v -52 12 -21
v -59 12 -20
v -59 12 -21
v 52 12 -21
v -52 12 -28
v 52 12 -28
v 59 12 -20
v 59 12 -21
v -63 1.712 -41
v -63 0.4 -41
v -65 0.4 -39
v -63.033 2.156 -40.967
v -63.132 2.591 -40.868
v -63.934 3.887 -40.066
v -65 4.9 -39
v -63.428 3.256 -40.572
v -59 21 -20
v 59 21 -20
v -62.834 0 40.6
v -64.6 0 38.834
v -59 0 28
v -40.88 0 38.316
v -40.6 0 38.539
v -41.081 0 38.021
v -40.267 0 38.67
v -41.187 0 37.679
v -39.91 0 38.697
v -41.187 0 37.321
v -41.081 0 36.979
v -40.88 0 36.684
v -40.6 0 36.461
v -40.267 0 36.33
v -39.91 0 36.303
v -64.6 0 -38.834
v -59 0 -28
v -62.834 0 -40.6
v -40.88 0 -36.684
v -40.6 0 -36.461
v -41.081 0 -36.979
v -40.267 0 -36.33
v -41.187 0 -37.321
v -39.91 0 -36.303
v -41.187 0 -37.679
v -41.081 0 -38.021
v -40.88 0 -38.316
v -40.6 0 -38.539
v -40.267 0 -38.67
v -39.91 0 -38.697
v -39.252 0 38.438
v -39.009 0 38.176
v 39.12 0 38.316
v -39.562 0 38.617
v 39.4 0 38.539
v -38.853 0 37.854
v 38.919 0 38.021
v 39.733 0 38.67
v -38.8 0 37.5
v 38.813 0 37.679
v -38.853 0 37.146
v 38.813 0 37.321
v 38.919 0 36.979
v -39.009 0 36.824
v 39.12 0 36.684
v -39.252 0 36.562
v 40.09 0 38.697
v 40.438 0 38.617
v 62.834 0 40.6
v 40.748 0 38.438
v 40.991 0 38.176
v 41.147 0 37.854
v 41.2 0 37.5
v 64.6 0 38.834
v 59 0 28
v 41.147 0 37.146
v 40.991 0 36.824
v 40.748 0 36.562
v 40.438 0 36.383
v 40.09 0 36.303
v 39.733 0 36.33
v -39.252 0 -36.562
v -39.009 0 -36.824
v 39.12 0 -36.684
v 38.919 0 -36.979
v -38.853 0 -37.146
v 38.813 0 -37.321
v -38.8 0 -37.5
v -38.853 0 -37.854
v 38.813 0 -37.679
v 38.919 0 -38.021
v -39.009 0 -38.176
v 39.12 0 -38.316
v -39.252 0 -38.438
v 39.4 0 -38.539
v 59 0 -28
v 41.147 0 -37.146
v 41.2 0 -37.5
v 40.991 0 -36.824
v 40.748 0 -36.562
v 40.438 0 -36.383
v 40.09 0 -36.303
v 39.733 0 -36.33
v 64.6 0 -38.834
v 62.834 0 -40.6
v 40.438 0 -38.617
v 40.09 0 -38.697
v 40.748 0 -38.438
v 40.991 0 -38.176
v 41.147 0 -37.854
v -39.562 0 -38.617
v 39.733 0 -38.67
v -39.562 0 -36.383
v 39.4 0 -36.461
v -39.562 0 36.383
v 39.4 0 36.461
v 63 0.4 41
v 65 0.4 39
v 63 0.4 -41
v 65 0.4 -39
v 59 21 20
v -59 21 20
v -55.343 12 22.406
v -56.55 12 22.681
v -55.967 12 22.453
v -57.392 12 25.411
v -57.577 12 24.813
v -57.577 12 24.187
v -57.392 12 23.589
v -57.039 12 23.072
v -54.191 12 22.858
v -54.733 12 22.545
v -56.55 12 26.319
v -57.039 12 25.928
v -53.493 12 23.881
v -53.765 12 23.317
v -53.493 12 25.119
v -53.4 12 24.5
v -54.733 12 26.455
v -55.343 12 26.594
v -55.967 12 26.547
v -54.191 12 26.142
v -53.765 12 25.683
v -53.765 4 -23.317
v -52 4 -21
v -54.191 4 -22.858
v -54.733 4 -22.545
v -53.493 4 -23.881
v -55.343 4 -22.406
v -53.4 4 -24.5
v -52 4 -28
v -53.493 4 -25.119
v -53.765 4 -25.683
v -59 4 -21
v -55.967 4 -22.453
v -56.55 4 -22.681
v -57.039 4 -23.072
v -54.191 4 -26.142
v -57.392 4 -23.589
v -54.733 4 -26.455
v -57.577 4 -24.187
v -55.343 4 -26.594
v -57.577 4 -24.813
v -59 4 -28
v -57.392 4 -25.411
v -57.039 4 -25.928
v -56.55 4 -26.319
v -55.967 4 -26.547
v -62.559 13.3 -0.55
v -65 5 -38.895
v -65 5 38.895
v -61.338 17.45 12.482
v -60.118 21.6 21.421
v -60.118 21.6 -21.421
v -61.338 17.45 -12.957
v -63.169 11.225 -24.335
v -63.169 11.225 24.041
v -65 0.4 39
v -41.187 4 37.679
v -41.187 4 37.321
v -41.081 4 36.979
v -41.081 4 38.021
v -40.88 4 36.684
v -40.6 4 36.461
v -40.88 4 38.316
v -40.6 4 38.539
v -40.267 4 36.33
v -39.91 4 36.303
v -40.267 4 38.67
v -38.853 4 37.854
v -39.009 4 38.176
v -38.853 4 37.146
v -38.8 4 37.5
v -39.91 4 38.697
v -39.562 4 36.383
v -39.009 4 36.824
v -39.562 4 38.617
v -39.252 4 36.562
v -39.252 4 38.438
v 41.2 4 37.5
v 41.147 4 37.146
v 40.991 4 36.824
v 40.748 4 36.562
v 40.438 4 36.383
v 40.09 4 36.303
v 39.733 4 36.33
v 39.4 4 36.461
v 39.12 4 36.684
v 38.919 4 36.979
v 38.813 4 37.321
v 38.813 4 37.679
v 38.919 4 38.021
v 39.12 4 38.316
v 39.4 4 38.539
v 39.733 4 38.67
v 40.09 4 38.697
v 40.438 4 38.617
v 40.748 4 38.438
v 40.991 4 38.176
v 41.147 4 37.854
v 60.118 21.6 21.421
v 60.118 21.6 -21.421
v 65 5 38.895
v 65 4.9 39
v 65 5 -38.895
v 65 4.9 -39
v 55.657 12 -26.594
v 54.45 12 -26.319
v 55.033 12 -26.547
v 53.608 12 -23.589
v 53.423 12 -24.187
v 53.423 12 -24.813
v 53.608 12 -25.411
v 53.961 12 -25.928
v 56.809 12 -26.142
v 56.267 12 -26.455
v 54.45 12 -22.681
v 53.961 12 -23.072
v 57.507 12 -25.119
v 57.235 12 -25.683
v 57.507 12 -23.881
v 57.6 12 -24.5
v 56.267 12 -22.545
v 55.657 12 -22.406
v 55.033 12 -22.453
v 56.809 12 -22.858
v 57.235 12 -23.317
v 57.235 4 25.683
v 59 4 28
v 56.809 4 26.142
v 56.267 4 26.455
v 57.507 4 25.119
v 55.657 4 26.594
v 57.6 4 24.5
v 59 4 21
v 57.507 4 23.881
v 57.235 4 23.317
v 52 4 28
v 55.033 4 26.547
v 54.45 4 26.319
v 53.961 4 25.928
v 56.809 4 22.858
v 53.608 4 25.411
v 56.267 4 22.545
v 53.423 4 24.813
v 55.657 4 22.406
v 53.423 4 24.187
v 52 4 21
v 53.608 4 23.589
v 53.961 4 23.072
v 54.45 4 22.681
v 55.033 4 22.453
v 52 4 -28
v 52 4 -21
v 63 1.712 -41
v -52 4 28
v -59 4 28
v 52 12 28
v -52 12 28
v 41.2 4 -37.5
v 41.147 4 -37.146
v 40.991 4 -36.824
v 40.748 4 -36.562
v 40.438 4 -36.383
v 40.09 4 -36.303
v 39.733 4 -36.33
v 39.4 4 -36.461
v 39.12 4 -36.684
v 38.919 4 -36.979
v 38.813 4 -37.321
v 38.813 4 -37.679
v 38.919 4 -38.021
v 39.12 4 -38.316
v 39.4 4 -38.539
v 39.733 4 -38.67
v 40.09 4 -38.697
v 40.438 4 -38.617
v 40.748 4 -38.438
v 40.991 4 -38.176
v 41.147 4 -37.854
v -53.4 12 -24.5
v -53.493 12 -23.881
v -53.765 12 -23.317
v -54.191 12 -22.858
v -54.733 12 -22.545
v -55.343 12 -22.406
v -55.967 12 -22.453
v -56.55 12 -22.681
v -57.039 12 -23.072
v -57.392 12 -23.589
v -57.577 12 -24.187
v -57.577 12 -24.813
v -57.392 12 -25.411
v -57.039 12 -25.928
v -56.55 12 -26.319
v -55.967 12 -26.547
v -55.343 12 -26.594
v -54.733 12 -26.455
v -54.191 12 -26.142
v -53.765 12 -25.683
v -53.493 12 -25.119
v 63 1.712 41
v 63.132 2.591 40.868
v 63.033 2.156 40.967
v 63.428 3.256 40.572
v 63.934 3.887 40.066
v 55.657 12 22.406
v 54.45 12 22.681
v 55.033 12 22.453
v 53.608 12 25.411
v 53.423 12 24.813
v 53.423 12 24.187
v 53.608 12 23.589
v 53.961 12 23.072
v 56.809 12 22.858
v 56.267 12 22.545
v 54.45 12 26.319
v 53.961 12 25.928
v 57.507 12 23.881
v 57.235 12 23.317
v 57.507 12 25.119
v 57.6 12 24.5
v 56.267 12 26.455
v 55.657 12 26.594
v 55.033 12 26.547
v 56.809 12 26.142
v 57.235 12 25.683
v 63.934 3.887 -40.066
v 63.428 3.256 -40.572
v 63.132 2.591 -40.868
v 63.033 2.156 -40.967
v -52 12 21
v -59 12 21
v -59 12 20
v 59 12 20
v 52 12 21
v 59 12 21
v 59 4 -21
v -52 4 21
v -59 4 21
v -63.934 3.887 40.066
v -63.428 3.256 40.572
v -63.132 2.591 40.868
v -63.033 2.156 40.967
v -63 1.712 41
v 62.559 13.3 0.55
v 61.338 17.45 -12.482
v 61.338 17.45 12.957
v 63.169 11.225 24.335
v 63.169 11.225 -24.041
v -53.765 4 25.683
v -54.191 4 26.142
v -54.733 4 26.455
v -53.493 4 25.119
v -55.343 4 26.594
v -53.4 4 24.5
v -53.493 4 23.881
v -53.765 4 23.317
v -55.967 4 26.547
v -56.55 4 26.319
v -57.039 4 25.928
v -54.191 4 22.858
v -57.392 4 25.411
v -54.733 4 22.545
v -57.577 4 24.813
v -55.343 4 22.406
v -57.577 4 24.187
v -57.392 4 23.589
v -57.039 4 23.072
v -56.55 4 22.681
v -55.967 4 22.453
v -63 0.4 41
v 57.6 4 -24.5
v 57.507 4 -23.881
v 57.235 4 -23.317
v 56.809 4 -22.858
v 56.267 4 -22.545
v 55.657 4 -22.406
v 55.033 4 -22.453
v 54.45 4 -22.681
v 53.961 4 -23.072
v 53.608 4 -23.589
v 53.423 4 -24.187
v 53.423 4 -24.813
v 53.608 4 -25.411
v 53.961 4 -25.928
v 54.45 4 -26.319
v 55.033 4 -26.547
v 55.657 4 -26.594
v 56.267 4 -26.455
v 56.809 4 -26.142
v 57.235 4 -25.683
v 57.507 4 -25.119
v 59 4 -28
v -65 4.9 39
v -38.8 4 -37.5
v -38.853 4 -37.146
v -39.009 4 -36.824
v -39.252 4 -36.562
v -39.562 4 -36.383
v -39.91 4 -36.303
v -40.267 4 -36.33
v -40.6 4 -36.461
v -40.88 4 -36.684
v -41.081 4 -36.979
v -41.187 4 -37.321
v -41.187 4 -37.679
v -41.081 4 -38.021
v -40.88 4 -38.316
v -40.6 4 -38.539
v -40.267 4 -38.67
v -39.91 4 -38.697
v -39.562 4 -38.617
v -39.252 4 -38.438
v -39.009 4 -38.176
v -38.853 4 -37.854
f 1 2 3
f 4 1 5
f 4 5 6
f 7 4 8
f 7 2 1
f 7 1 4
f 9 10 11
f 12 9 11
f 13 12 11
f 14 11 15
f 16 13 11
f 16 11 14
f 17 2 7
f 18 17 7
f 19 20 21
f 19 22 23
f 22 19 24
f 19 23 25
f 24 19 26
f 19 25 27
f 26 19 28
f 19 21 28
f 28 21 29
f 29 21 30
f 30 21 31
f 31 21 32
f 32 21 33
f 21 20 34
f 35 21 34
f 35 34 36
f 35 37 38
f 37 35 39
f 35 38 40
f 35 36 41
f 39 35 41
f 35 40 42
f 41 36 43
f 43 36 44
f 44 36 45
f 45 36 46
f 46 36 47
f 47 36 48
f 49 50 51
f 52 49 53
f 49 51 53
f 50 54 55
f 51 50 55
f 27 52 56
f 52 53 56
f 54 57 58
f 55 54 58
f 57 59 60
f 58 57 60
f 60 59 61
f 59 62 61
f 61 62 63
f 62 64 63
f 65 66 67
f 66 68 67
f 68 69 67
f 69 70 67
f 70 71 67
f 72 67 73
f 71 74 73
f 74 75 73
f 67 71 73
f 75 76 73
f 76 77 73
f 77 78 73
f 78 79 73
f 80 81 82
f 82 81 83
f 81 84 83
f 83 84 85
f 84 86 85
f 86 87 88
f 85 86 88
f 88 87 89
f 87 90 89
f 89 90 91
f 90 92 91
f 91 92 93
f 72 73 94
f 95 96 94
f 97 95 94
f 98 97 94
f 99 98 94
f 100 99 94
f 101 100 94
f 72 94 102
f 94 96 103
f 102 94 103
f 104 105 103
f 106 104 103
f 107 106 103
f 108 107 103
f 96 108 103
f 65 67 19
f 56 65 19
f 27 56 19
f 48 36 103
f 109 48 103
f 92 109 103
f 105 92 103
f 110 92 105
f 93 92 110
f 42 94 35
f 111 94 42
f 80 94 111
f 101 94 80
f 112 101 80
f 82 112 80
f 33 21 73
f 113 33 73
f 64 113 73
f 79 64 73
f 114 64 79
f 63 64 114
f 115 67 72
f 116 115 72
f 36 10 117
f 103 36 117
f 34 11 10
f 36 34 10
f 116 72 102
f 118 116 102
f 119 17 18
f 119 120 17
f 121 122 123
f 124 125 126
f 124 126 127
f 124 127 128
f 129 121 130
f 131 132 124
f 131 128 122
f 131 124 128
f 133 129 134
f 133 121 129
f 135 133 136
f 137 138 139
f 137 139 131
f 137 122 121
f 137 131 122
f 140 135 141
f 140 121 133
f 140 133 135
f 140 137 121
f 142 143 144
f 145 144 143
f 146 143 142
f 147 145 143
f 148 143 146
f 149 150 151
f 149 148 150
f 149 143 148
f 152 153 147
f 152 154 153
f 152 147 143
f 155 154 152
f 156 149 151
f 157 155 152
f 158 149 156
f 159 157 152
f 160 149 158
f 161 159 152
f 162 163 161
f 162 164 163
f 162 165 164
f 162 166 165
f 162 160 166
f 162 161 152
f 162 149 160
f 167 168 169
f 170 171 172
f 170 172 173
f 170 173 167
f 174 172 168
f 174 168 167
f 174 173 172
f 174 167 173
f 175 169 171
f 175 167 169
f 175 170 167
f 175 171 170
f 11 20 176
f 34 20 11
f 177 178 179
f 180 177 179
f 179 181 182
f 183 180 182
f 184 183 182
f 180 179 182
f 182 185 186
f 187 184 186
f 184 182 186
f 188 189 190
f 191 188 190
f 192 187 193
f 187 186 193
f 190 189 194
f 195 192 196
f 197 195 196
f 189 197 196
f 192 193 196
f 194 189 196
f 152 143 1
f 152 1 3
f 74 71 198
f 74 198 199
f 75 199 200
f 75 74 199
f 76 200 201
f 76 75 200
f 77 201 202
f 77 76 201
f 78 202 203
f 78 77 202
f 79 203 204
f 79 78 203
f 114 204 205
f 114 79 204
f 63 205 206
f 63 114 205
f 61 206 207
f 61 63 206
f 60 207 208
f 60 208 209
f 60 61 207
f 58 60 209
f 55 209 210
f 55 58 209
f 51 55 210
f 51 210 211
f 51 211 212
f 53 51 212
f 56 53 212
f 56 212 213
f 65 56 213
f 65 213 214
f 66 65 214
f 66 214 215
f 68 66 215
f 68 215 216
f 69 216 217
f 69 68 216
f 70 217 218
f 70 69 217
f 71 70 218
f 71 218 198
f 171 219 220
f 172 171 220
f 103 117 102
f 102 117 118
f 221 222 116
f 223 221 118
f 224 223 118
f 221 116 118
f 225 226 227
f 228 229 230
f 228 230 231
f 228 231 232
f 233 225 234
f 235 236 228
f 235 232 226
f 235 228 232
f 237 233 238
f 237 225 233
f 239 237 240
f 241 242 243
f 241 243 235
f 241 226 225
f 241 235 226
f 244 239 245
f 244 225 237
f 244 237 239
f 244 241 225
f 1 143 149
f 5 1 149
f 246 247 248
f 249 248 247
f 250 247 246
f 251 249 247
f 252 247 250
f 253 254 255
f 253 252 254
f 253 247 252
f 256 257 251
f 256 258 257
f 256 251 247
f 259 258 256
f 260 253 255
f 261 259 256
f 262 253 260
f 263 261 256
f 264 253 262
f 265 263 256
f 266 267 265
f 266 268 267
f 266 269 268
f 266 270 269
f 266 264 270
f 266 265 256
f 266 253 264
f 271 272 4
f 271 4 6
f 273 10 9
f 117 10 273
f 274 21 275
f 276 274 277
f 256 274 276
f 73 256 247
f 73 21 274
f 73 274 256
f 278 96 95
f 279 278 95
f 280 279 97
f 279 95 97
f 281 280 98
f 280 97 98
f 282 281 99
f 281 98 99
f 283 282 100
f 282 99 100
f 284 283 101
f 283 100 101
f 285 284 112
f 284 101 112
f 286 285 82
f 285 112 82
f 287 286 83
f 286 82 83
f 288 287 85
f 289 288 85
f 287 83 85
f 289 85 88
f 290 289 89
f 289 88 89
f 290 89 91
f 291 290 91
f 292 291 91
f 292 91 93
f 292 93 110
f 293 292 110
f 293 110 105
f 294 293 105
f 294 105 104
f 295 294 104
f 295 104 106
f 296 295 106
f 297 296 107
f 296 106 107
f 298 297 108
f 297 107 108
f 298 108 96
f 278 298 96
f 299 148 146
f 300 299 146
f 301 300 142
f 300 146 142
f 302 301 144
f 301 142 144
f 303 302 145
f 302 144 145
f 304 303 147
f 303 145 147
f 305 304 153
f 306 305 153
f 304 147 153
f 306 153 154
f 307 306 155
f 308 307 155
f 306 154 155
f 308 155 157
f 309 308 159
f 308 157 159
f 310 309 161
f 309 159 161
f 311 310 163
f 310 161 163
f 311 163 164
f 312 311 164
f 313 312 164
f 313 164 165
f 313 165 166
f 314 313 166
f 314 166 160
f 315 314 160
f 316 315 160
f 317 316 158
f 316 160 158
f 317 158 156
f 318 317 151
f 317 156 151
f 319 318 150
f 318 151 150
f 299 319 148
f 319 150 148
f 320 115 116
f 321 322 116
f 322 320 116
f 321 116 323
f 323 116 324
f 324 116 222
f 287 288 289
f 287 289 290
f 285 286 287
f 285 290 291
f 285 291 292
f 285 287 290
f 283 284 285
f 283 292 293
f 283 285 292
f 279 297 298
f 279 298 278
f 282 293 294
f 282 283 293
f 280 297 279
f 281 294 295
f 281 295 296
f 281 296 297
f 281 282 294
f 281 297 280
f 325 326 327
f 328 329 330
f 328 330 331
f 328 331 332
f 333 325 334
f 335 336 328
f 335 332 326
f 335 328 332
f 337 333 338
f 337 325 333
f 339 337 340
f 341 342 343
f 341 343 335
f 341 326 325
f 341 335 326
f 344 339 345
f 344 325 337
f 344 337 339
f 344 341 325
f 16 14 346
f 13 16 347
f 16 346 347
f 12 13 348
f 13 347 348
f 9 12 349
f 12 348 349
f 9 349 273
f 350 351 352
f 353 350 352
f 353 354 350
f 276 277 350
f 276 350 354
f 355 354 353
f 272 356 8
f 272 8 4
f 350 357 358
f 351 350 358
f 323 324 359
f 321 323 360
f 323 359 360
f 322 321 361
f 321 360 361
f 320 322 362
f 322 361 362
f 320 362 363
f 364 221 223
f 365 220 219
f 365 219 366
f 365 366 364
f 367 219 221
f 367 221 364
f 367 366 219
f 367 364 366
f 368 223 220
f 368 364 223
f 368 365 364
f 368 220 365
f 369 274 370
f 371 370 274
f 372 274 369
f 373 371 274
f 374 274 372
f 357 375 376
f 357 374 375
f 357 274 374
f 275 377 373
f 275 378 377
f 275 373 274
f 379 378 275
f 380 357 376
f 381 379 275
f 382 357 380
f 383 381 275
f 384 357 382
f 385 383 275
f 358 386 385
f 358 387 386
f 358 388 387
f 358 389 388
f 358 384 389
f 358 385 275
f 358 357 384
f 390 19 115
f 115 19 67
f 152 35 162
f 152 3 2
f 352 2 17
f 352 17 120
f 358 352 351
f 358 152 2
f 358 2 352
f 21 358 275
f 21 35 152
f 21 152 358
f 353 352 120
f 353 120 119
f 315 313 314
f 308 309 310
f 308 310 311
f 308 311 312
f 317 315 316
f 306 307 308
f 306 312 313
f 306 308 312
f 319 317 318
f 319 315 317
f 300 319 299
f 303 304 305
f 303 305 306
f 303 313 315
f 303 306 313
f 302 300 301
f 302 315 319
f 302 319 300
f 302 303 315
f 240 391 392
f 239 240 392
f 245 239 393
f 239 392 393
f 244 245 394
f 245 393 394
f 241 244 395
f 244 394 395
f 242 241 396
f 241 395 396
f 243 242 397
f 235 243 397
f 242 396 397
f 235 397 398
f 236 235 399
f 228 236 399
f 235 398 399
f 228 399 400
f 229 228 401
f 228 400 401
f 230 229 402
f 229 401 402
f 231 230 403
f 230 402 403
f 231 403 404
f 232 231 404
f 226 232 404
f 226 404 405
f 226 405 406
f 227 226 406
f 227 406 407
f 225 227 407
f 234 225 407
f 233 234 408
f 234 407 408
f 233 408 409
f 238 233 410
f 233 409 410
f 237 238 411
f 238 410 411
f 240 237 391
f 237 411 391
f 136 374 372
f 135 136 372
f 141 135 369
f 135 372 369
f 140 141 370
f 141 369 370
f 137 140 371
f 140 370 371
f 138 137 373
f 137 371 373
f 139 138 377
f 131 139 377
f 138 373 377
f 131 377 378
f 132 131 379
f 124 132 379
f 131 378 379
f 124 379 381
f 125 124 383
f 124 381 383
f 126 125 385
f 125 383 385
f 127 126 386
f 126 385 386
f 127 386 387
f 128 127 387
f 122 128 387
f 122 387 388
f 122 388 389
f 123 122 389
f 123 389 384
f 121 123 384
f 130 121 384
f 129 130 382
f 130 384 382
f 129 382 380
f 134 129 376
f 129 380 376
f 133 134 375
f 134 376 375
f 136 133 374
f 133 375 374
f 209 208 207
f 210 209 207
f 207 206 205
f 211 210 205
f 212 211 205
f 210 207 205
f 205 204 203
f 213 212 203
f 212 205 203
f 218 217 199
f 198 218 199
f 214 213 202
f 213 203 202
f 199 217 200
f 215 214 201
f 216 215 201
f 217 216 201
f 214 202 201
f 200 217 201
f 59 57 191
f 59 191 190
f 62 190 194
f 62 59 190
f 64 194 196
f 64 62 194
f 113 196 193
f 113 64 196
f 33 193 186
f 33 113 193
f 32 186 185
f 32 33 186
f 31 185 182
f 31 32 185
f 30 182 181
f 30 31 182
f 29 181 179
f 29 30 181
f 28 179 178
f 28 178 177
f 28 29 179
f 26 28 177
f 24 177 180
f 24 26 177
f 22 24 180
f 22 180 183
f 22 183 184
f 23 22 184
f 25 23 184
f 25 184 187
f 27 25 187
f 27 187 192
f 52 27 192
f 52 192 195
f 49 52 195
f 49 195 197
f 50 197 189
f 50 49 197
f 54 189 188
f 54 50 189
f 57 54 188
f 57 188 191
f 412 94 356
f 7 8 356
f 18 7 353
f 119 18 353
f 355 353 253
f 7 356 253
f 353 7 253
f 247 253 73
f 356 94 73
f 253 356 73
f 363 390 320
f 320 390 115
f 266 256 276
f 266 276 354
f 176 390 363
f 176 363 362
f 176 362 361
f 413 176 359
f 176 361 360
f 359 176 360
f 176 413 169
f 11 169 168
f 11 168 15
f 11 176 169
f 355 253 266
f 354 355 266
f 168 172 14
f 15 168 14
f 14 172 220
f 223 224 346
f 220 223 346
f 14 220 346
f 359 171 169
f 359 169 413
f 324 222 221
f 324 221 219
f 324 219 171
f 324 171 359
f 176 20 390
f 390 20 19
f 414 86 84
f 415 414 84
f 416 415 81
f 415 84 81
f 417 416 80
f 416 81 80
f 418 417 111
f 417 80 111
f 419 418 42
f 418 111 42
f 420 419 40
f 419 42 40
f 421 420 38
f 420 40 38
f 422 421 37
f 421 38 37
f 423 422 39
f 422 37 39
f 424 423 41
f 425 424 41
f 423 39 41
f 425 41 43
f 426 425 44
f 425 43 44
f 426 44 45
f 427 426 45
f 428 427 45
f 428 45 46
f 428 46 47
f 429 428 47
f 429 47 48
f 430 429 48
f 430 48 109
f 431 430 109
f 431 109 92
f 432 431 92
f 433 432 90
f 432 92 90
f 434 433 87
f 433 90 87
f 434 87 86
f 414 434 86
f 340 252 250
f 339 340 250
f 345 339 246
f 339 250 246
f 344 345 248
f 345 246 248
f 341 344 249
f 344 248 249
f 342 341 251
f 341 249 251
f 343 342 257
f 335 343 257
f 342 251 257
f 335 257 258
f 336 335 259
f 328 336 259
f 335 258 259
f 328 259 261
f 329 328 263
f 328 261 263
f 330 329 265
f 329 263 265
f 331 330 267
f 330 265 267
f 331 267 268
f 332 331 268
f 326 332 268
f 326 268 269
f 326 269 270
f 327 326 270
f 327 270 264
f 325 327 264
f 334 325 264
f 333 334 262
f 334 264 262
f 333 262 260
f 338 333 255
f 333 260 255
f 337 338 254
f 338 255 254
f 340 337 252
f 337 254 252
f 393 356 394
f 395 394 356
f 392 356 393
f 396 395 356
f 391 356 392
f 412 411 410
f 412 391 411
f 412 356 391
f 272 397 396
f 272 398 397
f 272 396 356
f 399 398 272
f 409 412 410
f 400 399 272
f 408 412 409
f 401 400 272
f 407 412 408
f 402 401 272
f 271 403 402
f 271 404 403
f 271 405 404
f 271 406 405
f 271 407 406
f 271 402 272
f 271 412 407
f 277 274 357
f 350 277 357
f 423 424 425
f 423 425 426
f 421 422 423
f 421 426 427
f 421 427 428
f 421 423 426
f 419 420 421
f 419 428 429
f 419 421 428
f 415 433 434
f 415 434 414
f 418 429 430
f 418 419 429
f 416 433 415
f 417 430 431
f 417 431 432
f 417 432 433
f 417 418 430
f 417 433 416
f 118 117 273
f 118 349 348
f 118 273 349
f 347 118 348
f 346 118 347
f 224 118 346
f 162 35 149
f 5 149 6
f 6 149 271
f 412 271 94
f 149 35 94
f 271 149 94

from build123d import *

# Parameters (mm, degrees)
SKETCH1_W               = 130
SKETCH1_H               = 82
BOSS_EXTRUDE1_DEPTH     = 5
SKETCH3_W               = 130
SKETCH3_H               = 82
SKETCH2_W               = 120
SKETCH2_H               = 46
CHAMFER1_SIZE           = 2
SKETCH4_R               = 1.2
CUT_EXTRUDE1_DEPTH      = 4
SKETCH5_W               = 114
SKETCH5_H               = 40
CUT_EXTRUDE2_DEPTH      = 21
SKETCH6_W               = 118
SKETCH6_H               = 56
CUT_EXTRUDE3_DEPTH      = 12
SKETCH8_W               = 7
SKETCH8_H               = 7
BOSS_EXTRUDE2_DEPTH     = 8
SKETCH9_R               = 2.1
CUT_EXTRUDE4_DEPTH      = 8
SKETCH10_W              = 2
SKETCH10_H              = 40
CUT_EXTRUDE5_DEPTH      = 9
CUT_EXTRUDE6_DEPTH      = 66.0000001
CUT_EXTRUDE6_DEPTH_BACK = 66.0000001
SKETCH12_W              = 82
SKETCH12_H              = 2
CUT_EXTRUDE7_DEPTH      = 66.0000001
CUT_EXTRUDE7_DEPTH_BACK = 66.0000001
FILLET1_R               = 3
CHAMFER2_SIZE           = 0.4


with BuildPart() as part:
    # Sketch1 → Boss-Extrude1 (new body)
    with BuildSketch(Plane(origin=(0, 0, 0), x_dir=(1, 0, 0), z_dir=(0, 1, 0))):
        Rectangle(SKETCH1_W, SKETCH1_H)
    extrude(amount=BOSS_EXTRUDE1_DEPTH)

    # Sketch3 → Loft2 section 0
    with BuildSketch(Plane(origin=(0, 5, 0), x_dir=(1, 0, 0), z_dir=(0, 1, 0))):
        Rectangle(SKETCH3_W, SKETCH3_H)
    # Sketch2 → Loft2 section 1
    with BuildSketch(Plane(origin=(0, 22, 0), x_dir=(1, 0, 0), z_dir=(0, 1, 0))):
        Rectangle(SKETCH2_W, SKETCH2_H)
    loft()

    # Chamfer1
    chamfer1_edges = [part.edges().sort_by_distance(p)[0] for p in [
        (-65, 2.5, 41),
        (65, 2.5, 41),
        (65, 2.5, -41),
        (-65, 2.5, -41),
    ]]
    chamfer(chamfer1_edges, length=CHAMFER1_SIZE)

    # Sketch4 → Cut-Extrude1 (cut)
    with BuildSketch(Plane.XZ):
        with Locations((40, -37.5)):
            Circle(SKETCH4_R)
        with Locations((-40, -37.5)):
            Circle(SKETCH4_R)
    cut_extrude1 = extrude(amount=-CUT_EXTRUDE1_DEPTH, mode=Mode.SUBTRACT)

    # Sketch5 → Cut-Extrude2 (cut)
    with BuildSketch(Plane.XZ):
        Rectangle(SKETCH5_W, SKETCH5_H)
    extrude(amount=-CUT_EXTRUDE2_DEPTH, mode=Mode.SUBTRACT)

    # Mirror1: Cut-Extrude1 across plane
    add(cut_extrude1.mirror(Plane.XY), mode=Mode.SUBTRACT)

    # Sketch6 → Cut-Extrude3 (cut)
    with BuildSketch(Plane.XZ):
        Rectangle(SKETCH6_W, SKETCH6_H)
    extrude(amount=-CUT_EXTRUDE3_DEPTH, mode=Mode.SUBTRACT)

    # Sketch8 → Boss-Extrude2 (add)
    with BuildSketch(Plane(origin=(0, 4, 0), x_dir=(-1, 0, 0), z_dir=(0, -1, 0))):
        with Locations((-55.5, 24.5)):
            Rectangle(SKETCH8_W, SKETCH8_H)
        with Locations((-55.5, -24.5)):
            Rectangle(SKETCH8_W, SKETCH8_H)
        with Locations((55.5, -24.5)):
            Rectangle(SKETCH8_W, SKETCH8_H)
        with Locations((55.5, 24.5)):
            Rectangle(SKETCH8_W, SKETCH8_H)
    extrude(amount=-BOSS_EXTRUDE2_DEPTH)

    # Sketch9 → Cut-Extrude4 (cut)
    with BuildSketch(Plane.XZ.offset(-4)):
        with Locations((-55.5, 24.5)):
            Circle(SKETCH9_R)
        with Locations((55.5, 24.5)):
            Circle(SKETCH9_R)
        with Locations((55.5, -24.5)):
            Circle(SKETCH9_R)
        with Locations((-55.5, -24.5)):
            Circle(SKETCH9_R)
    extrude(amount=-CUT_EXTRUDE4_DEPTH, mode=Mode.SUBTRACT)

    # Sketch10 → Cut-Extrude5 (cut)
    with BuildSketch(Plane.XZ.offset(-12)):
        with Locations((-58, 0)):
            Rectangle(SKETCH10_W, SKETCH10_H)
        with Locations((58, 0)):
            Rectangle(SKETCH10_W, SKETCH10_H)
    extrude(amount=-CUT_EXTRUDE5_DEPTH, mode=Mode.SUBTRACT)

    # Sketch11 → Cut-Extrude6 (cut, two sides)
    with BuildSketch(Plane(origin=(0, 0, 0), x_dir=(0, 0, -1), z_dir=(1, 0, 0))) as cut_extrude6_sk:
        Polygon((21, 22), (41, 3), (41, 5), (23, 22), align=None)
        Polygon((-23, 22), (-21, 22), (-41, 3), (-41, 5), align=None)
    extrude(amount=CUT_EXTRUDE6_DEPTH, mode=Mode.SUBTRACT)
    extrude(cut_extrude6_sk.sketch, amount=-CUT_EXTRUDE6_DEPTH_BACK, mode=Mode.SUBTRACT)

    # Sketch12 → Cut-Extrude7 (cut, two sides)
    with BuildSketch(Plane(origin=(0, 0, 0), x_dir=(0, 0, -1), z_dir=(1, 0, 0))) as cut_extrude7_sk:
        with Locations((0, 22.6)):
            Rectangle(SKETCH12_W, SKETCH12_H)
    extrude(amount=CUT_EXTRUDE7_DEPTH, mode=Mode.SUBTRACT)
    extrude(cut_extrude7_sk.sketch, amount=-CUT_EXTRUDE7_DEPTH_BACK, mode=Mode.SUBTRACT)

    # Fillet1
    fillet1_edges = [part.edges().sort_by_distance(p)[0] for p in [
        (0, 3, -41),
        (0, 3, 41),
    ]]
    fillet(fillet1_edges, radius=FILLET1_R)

    # Chamfer2
    chamfer2_edges = [part.edges().sort_by_distance(p)[0] for p in [
        (0, 0, 41),
        (65, 0, 0),
        (-65, 0, 0),
        (0, 0, -41),
        (-64, 0, -40),
        (64, 0, -40),
        (64, 0, 40),
        (-64, 0, 40),
    ]]
    chamfer(chamfer2_edges, length=CHAMFER2_SIZE)


solid = part.part
